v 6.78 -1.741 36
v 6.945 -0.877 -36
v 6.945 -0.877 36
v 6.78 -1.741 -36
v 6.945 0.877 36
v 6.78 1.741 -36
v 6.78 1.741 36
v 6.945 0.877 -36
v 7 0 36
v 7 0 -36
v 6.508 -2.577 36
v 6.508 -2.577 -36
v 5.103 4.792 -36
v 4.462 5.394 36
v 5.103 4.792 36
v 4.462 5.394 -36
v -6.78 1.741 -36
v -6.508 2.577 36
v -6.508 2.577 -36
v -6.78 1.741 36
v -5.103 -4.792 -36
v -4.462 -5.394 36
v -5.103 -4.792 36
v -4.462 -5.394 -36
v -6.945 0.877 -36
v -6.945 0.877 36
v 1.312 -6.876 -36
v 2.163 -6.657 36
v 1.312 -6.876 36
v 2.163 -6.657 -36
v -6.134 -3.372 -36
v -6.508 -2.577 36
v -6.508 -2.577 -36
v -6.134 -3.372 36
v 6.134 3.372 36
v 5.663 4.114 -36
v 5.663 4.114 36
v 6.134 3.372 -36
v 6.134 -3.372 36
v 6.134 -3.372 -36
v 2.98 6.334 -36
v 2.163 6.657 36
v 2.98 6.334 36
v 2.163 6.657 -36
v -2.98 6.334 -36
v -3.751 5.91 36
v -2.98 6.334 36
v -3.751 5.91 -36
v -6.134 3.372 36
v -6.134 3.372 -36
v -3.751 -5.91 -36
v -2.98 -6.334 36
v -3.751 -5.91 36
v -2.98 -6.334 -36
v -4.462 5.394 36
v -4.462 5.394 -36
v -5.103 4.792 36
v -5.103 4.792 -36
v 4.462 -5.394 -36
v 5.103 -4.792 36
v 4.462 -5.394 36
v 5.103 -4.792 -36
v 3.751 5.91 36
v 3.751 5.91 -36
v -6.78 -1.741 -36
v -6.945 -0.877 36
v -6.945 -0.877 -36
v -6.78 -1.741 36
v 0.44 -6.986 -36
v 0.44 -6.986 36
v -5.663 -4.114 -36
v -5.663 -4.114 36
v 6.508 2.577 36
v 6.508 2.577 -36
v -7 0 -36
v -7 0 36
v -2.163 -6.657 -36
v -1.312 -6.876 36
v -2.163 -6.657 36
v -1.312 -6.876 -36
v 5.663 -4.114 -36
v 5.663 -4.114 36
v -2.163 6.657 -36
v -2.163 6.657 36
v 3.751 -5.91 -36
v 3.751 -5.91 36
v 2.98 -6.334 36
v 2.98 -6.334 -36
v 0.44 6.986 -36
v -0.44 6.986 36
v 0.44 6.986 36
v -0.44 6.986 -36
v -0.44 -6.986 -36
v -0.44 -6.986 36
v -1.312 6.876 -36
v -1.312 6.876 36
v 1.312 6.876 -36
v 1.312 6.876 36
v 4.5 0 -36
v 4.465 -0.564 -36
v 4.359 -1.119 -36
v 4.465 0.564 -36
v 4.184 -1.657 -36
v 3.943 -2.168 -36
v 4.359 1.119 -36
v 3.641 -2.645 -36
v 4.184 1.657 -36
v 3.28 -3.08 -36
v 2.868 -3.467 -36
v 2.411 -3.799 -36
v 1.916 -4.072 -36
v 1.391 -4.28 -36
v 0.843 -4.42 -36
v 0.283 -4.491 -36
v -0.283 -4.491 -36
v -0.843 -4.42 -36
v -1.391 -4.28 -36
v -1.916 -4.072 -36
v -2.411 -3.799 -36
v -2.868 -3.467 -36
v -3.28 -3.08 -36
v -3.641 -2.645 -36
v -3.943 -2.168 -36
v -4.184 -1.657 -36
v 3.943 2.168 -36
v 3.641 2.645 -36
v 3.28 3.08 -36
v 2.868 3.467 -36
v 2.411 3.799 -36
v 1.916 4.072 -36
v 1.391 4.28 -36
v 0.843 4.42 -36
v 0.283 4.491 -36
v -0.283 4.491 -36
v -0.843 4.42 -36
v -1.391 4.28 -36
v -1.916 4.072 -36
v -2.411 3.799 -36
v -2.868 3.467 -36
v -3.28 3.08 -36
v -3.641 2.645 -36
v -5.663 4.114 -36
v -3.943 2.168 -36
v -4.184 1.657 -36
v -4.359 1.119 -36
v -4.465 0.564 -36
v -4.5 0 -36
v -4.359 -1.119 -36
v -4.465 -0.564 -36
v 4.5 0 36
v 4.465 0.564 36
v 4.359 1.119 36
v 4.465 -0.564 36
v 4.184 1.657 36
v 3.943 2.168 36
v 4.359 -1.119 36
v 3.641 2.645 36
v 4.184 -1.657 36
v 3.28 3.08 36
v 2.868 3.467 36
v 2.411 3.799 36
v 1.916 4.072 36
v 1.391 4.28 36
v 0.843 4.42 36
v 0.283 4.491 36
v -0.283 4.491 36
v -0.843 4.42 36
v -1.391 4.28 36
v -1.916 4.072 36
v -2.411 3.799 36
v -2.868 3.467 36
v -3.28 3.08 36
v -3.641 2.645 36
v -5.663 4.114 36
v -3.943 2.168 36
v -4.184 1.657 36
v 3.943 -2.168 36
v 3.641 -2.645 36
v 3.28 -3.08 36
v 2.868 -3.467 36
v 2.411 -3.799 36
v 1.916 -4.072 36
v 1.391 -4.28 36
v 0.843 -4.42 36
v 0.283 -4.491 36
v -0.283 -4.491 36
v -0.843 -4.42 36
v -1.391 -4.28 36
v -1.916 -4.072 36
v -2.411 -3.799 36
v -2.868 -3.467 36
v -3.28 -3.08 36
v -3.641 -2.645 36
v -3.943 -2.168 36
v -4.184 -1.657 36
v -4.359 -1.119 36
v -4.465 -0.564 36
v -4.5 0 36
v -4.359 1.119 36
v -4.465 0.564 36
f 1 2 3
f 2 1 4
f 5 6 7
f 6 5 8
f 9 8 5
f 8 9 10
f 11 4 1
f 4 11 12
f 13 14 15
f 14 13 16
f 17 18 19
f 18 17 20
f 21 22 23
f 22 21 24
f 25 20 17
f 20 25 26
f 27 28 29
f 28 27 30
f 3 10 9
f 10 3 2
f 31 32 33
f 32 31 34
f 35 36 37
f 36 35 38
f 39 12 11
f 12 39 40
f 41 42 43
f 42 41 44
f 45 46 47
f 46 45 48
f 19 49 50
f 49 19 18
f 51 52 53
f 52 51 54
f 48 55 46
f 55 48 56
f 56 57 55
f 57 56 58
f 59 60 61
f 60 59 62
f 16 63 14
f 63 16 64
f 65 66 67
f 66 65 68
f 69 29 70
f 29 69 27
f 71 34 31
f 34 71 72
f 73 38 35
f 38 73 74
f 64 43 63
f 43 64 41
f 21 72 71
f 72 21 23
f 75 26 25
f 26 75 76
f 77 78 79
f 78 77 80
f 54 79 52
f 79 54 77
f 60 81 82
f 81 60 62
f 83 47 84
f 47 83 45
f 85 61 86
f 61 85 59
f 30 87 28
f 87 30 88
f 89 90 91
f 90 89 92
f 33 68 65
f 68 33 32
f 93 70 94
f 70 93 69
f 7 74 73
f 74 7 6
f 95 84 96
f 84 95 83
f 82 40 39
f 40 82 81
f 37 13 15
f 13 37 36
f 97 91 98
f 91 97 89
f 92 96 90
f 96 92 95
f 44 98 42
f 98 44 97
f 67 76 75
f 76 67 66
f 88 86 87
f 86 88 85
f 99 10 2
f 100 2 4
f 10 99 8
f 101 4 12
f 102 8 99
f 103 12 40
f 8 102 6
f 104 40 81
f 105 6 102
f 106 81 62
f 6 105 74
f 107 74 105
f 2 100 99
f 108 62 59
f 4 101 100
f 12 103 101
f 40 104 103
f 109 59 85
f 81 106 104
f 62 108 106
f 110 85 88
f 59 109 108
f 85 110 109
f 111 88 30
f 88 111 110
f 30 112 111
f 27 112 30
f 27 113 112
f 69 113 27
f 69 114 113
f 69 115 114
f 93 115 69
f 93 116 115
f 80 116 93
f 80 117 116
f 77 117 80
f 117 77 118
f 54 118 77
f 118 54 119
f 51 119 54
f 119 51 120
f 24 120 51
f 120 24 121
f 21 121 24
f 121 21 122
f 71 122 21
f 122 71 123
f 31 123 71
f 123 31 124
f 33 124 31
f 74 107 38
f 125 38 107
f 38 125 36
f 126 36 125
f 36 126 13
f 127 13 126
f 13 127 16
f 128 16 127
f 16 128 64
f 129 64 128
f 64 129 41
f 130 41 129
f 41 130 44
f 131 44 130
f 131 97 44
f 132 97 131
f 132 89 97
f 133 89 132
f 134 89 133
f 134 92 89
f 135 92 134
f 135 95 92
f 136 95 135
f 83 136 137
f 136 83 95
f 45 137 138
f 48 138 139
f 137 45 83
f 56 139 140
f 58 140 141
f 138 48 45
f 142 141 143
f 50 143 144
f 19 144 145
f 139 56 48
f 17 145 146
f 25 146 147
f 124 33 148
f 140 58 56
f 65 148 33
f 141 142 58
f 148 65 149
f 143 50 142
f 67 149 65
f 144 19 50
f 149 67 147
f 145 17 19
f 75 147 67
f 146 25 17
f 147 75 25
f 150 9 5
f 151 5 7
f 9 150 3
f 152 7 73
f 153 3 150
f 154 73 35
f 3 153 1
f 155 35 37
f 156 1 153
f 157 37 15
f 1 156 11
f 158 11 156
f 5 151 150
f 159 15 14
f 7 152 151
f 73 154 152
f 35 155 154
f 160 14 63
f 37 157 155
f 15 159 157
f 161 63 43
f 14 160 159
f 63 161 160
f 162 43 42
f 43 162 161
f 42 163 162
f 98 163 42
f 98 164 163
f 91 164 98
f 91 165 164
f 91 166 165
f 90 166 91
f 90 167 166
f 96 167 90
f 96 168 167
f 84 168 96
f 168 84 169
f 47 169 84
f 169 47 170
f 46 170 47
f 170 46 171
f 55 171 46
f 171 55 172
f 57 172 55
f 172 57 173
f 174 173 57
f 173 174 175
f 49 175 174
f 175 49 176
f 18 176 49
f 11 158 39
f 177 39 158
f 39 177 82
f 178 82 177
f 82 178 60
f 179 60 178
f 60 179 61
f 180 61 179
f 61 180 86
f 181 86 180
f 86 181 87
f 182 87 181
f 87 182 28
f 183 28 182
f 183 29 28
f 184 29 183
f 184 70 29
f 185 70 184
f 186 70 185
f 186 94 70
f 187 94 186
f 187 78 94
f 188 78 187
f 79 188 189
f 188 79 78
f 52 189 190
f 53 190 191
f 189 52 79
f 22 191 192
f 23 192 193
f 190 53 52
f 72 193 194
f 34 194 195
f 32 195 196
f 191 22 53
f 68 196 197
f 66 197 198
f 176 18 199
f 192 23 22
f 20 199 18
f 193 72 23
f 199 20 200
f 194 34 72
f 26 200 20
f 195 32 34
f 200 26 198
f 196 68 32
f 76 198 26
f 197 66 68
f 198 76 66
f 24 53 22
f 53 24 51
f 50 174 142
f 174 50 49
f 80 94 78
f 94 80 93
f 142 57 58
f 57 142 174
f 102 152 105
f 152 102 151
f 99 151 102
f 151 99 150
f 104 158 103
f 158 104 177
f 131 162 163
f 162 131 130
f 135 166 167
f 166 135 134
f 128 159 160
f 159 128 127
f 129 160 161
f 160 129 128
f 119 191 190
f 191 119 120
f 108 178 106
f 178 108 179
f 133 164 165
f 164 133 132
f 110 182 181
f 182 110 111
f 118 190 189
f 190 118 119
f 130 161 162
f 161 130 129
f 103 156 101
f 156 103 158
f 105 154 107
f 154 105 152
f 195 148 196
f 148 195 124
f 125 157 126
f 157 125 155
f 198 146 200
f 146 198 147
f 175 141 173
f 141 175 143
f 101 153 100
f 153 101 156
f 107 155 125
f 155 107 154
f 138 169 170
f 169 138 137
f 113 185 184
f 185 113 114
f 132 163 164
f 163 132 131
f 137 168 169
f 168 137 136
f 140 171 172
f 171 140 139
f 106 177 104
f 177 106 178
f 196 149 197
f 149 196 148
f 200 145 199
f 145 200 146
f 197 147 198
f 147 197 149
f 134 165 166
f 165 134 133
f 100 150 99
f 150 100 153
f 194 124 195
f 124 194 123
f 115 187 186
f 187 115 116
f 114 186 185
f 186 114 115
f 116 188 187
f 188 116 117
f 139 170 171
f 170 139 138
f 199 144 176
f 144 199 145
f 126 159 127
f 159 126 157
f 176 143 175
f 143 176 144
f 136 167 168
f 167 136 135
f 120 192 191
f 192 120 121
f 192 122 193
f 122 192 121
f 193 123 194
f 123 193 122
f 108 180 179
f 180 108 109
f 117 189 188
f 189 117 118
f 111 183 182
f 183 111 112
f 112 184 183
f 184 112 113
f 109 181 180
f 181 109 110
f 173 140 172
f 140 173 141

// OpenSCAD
$fn = 50;


difference() {
	union() {
		translate(v = [0, 0, -36.0000000000]) {
			cylinder(h = 72, r = 7.0000000000);
		}
	}
	union() {
		translate(v = [0, 0, -100.0000000000]) {
			cylinder(h = 200, r = 4.5000000000);
		}
	}
}
